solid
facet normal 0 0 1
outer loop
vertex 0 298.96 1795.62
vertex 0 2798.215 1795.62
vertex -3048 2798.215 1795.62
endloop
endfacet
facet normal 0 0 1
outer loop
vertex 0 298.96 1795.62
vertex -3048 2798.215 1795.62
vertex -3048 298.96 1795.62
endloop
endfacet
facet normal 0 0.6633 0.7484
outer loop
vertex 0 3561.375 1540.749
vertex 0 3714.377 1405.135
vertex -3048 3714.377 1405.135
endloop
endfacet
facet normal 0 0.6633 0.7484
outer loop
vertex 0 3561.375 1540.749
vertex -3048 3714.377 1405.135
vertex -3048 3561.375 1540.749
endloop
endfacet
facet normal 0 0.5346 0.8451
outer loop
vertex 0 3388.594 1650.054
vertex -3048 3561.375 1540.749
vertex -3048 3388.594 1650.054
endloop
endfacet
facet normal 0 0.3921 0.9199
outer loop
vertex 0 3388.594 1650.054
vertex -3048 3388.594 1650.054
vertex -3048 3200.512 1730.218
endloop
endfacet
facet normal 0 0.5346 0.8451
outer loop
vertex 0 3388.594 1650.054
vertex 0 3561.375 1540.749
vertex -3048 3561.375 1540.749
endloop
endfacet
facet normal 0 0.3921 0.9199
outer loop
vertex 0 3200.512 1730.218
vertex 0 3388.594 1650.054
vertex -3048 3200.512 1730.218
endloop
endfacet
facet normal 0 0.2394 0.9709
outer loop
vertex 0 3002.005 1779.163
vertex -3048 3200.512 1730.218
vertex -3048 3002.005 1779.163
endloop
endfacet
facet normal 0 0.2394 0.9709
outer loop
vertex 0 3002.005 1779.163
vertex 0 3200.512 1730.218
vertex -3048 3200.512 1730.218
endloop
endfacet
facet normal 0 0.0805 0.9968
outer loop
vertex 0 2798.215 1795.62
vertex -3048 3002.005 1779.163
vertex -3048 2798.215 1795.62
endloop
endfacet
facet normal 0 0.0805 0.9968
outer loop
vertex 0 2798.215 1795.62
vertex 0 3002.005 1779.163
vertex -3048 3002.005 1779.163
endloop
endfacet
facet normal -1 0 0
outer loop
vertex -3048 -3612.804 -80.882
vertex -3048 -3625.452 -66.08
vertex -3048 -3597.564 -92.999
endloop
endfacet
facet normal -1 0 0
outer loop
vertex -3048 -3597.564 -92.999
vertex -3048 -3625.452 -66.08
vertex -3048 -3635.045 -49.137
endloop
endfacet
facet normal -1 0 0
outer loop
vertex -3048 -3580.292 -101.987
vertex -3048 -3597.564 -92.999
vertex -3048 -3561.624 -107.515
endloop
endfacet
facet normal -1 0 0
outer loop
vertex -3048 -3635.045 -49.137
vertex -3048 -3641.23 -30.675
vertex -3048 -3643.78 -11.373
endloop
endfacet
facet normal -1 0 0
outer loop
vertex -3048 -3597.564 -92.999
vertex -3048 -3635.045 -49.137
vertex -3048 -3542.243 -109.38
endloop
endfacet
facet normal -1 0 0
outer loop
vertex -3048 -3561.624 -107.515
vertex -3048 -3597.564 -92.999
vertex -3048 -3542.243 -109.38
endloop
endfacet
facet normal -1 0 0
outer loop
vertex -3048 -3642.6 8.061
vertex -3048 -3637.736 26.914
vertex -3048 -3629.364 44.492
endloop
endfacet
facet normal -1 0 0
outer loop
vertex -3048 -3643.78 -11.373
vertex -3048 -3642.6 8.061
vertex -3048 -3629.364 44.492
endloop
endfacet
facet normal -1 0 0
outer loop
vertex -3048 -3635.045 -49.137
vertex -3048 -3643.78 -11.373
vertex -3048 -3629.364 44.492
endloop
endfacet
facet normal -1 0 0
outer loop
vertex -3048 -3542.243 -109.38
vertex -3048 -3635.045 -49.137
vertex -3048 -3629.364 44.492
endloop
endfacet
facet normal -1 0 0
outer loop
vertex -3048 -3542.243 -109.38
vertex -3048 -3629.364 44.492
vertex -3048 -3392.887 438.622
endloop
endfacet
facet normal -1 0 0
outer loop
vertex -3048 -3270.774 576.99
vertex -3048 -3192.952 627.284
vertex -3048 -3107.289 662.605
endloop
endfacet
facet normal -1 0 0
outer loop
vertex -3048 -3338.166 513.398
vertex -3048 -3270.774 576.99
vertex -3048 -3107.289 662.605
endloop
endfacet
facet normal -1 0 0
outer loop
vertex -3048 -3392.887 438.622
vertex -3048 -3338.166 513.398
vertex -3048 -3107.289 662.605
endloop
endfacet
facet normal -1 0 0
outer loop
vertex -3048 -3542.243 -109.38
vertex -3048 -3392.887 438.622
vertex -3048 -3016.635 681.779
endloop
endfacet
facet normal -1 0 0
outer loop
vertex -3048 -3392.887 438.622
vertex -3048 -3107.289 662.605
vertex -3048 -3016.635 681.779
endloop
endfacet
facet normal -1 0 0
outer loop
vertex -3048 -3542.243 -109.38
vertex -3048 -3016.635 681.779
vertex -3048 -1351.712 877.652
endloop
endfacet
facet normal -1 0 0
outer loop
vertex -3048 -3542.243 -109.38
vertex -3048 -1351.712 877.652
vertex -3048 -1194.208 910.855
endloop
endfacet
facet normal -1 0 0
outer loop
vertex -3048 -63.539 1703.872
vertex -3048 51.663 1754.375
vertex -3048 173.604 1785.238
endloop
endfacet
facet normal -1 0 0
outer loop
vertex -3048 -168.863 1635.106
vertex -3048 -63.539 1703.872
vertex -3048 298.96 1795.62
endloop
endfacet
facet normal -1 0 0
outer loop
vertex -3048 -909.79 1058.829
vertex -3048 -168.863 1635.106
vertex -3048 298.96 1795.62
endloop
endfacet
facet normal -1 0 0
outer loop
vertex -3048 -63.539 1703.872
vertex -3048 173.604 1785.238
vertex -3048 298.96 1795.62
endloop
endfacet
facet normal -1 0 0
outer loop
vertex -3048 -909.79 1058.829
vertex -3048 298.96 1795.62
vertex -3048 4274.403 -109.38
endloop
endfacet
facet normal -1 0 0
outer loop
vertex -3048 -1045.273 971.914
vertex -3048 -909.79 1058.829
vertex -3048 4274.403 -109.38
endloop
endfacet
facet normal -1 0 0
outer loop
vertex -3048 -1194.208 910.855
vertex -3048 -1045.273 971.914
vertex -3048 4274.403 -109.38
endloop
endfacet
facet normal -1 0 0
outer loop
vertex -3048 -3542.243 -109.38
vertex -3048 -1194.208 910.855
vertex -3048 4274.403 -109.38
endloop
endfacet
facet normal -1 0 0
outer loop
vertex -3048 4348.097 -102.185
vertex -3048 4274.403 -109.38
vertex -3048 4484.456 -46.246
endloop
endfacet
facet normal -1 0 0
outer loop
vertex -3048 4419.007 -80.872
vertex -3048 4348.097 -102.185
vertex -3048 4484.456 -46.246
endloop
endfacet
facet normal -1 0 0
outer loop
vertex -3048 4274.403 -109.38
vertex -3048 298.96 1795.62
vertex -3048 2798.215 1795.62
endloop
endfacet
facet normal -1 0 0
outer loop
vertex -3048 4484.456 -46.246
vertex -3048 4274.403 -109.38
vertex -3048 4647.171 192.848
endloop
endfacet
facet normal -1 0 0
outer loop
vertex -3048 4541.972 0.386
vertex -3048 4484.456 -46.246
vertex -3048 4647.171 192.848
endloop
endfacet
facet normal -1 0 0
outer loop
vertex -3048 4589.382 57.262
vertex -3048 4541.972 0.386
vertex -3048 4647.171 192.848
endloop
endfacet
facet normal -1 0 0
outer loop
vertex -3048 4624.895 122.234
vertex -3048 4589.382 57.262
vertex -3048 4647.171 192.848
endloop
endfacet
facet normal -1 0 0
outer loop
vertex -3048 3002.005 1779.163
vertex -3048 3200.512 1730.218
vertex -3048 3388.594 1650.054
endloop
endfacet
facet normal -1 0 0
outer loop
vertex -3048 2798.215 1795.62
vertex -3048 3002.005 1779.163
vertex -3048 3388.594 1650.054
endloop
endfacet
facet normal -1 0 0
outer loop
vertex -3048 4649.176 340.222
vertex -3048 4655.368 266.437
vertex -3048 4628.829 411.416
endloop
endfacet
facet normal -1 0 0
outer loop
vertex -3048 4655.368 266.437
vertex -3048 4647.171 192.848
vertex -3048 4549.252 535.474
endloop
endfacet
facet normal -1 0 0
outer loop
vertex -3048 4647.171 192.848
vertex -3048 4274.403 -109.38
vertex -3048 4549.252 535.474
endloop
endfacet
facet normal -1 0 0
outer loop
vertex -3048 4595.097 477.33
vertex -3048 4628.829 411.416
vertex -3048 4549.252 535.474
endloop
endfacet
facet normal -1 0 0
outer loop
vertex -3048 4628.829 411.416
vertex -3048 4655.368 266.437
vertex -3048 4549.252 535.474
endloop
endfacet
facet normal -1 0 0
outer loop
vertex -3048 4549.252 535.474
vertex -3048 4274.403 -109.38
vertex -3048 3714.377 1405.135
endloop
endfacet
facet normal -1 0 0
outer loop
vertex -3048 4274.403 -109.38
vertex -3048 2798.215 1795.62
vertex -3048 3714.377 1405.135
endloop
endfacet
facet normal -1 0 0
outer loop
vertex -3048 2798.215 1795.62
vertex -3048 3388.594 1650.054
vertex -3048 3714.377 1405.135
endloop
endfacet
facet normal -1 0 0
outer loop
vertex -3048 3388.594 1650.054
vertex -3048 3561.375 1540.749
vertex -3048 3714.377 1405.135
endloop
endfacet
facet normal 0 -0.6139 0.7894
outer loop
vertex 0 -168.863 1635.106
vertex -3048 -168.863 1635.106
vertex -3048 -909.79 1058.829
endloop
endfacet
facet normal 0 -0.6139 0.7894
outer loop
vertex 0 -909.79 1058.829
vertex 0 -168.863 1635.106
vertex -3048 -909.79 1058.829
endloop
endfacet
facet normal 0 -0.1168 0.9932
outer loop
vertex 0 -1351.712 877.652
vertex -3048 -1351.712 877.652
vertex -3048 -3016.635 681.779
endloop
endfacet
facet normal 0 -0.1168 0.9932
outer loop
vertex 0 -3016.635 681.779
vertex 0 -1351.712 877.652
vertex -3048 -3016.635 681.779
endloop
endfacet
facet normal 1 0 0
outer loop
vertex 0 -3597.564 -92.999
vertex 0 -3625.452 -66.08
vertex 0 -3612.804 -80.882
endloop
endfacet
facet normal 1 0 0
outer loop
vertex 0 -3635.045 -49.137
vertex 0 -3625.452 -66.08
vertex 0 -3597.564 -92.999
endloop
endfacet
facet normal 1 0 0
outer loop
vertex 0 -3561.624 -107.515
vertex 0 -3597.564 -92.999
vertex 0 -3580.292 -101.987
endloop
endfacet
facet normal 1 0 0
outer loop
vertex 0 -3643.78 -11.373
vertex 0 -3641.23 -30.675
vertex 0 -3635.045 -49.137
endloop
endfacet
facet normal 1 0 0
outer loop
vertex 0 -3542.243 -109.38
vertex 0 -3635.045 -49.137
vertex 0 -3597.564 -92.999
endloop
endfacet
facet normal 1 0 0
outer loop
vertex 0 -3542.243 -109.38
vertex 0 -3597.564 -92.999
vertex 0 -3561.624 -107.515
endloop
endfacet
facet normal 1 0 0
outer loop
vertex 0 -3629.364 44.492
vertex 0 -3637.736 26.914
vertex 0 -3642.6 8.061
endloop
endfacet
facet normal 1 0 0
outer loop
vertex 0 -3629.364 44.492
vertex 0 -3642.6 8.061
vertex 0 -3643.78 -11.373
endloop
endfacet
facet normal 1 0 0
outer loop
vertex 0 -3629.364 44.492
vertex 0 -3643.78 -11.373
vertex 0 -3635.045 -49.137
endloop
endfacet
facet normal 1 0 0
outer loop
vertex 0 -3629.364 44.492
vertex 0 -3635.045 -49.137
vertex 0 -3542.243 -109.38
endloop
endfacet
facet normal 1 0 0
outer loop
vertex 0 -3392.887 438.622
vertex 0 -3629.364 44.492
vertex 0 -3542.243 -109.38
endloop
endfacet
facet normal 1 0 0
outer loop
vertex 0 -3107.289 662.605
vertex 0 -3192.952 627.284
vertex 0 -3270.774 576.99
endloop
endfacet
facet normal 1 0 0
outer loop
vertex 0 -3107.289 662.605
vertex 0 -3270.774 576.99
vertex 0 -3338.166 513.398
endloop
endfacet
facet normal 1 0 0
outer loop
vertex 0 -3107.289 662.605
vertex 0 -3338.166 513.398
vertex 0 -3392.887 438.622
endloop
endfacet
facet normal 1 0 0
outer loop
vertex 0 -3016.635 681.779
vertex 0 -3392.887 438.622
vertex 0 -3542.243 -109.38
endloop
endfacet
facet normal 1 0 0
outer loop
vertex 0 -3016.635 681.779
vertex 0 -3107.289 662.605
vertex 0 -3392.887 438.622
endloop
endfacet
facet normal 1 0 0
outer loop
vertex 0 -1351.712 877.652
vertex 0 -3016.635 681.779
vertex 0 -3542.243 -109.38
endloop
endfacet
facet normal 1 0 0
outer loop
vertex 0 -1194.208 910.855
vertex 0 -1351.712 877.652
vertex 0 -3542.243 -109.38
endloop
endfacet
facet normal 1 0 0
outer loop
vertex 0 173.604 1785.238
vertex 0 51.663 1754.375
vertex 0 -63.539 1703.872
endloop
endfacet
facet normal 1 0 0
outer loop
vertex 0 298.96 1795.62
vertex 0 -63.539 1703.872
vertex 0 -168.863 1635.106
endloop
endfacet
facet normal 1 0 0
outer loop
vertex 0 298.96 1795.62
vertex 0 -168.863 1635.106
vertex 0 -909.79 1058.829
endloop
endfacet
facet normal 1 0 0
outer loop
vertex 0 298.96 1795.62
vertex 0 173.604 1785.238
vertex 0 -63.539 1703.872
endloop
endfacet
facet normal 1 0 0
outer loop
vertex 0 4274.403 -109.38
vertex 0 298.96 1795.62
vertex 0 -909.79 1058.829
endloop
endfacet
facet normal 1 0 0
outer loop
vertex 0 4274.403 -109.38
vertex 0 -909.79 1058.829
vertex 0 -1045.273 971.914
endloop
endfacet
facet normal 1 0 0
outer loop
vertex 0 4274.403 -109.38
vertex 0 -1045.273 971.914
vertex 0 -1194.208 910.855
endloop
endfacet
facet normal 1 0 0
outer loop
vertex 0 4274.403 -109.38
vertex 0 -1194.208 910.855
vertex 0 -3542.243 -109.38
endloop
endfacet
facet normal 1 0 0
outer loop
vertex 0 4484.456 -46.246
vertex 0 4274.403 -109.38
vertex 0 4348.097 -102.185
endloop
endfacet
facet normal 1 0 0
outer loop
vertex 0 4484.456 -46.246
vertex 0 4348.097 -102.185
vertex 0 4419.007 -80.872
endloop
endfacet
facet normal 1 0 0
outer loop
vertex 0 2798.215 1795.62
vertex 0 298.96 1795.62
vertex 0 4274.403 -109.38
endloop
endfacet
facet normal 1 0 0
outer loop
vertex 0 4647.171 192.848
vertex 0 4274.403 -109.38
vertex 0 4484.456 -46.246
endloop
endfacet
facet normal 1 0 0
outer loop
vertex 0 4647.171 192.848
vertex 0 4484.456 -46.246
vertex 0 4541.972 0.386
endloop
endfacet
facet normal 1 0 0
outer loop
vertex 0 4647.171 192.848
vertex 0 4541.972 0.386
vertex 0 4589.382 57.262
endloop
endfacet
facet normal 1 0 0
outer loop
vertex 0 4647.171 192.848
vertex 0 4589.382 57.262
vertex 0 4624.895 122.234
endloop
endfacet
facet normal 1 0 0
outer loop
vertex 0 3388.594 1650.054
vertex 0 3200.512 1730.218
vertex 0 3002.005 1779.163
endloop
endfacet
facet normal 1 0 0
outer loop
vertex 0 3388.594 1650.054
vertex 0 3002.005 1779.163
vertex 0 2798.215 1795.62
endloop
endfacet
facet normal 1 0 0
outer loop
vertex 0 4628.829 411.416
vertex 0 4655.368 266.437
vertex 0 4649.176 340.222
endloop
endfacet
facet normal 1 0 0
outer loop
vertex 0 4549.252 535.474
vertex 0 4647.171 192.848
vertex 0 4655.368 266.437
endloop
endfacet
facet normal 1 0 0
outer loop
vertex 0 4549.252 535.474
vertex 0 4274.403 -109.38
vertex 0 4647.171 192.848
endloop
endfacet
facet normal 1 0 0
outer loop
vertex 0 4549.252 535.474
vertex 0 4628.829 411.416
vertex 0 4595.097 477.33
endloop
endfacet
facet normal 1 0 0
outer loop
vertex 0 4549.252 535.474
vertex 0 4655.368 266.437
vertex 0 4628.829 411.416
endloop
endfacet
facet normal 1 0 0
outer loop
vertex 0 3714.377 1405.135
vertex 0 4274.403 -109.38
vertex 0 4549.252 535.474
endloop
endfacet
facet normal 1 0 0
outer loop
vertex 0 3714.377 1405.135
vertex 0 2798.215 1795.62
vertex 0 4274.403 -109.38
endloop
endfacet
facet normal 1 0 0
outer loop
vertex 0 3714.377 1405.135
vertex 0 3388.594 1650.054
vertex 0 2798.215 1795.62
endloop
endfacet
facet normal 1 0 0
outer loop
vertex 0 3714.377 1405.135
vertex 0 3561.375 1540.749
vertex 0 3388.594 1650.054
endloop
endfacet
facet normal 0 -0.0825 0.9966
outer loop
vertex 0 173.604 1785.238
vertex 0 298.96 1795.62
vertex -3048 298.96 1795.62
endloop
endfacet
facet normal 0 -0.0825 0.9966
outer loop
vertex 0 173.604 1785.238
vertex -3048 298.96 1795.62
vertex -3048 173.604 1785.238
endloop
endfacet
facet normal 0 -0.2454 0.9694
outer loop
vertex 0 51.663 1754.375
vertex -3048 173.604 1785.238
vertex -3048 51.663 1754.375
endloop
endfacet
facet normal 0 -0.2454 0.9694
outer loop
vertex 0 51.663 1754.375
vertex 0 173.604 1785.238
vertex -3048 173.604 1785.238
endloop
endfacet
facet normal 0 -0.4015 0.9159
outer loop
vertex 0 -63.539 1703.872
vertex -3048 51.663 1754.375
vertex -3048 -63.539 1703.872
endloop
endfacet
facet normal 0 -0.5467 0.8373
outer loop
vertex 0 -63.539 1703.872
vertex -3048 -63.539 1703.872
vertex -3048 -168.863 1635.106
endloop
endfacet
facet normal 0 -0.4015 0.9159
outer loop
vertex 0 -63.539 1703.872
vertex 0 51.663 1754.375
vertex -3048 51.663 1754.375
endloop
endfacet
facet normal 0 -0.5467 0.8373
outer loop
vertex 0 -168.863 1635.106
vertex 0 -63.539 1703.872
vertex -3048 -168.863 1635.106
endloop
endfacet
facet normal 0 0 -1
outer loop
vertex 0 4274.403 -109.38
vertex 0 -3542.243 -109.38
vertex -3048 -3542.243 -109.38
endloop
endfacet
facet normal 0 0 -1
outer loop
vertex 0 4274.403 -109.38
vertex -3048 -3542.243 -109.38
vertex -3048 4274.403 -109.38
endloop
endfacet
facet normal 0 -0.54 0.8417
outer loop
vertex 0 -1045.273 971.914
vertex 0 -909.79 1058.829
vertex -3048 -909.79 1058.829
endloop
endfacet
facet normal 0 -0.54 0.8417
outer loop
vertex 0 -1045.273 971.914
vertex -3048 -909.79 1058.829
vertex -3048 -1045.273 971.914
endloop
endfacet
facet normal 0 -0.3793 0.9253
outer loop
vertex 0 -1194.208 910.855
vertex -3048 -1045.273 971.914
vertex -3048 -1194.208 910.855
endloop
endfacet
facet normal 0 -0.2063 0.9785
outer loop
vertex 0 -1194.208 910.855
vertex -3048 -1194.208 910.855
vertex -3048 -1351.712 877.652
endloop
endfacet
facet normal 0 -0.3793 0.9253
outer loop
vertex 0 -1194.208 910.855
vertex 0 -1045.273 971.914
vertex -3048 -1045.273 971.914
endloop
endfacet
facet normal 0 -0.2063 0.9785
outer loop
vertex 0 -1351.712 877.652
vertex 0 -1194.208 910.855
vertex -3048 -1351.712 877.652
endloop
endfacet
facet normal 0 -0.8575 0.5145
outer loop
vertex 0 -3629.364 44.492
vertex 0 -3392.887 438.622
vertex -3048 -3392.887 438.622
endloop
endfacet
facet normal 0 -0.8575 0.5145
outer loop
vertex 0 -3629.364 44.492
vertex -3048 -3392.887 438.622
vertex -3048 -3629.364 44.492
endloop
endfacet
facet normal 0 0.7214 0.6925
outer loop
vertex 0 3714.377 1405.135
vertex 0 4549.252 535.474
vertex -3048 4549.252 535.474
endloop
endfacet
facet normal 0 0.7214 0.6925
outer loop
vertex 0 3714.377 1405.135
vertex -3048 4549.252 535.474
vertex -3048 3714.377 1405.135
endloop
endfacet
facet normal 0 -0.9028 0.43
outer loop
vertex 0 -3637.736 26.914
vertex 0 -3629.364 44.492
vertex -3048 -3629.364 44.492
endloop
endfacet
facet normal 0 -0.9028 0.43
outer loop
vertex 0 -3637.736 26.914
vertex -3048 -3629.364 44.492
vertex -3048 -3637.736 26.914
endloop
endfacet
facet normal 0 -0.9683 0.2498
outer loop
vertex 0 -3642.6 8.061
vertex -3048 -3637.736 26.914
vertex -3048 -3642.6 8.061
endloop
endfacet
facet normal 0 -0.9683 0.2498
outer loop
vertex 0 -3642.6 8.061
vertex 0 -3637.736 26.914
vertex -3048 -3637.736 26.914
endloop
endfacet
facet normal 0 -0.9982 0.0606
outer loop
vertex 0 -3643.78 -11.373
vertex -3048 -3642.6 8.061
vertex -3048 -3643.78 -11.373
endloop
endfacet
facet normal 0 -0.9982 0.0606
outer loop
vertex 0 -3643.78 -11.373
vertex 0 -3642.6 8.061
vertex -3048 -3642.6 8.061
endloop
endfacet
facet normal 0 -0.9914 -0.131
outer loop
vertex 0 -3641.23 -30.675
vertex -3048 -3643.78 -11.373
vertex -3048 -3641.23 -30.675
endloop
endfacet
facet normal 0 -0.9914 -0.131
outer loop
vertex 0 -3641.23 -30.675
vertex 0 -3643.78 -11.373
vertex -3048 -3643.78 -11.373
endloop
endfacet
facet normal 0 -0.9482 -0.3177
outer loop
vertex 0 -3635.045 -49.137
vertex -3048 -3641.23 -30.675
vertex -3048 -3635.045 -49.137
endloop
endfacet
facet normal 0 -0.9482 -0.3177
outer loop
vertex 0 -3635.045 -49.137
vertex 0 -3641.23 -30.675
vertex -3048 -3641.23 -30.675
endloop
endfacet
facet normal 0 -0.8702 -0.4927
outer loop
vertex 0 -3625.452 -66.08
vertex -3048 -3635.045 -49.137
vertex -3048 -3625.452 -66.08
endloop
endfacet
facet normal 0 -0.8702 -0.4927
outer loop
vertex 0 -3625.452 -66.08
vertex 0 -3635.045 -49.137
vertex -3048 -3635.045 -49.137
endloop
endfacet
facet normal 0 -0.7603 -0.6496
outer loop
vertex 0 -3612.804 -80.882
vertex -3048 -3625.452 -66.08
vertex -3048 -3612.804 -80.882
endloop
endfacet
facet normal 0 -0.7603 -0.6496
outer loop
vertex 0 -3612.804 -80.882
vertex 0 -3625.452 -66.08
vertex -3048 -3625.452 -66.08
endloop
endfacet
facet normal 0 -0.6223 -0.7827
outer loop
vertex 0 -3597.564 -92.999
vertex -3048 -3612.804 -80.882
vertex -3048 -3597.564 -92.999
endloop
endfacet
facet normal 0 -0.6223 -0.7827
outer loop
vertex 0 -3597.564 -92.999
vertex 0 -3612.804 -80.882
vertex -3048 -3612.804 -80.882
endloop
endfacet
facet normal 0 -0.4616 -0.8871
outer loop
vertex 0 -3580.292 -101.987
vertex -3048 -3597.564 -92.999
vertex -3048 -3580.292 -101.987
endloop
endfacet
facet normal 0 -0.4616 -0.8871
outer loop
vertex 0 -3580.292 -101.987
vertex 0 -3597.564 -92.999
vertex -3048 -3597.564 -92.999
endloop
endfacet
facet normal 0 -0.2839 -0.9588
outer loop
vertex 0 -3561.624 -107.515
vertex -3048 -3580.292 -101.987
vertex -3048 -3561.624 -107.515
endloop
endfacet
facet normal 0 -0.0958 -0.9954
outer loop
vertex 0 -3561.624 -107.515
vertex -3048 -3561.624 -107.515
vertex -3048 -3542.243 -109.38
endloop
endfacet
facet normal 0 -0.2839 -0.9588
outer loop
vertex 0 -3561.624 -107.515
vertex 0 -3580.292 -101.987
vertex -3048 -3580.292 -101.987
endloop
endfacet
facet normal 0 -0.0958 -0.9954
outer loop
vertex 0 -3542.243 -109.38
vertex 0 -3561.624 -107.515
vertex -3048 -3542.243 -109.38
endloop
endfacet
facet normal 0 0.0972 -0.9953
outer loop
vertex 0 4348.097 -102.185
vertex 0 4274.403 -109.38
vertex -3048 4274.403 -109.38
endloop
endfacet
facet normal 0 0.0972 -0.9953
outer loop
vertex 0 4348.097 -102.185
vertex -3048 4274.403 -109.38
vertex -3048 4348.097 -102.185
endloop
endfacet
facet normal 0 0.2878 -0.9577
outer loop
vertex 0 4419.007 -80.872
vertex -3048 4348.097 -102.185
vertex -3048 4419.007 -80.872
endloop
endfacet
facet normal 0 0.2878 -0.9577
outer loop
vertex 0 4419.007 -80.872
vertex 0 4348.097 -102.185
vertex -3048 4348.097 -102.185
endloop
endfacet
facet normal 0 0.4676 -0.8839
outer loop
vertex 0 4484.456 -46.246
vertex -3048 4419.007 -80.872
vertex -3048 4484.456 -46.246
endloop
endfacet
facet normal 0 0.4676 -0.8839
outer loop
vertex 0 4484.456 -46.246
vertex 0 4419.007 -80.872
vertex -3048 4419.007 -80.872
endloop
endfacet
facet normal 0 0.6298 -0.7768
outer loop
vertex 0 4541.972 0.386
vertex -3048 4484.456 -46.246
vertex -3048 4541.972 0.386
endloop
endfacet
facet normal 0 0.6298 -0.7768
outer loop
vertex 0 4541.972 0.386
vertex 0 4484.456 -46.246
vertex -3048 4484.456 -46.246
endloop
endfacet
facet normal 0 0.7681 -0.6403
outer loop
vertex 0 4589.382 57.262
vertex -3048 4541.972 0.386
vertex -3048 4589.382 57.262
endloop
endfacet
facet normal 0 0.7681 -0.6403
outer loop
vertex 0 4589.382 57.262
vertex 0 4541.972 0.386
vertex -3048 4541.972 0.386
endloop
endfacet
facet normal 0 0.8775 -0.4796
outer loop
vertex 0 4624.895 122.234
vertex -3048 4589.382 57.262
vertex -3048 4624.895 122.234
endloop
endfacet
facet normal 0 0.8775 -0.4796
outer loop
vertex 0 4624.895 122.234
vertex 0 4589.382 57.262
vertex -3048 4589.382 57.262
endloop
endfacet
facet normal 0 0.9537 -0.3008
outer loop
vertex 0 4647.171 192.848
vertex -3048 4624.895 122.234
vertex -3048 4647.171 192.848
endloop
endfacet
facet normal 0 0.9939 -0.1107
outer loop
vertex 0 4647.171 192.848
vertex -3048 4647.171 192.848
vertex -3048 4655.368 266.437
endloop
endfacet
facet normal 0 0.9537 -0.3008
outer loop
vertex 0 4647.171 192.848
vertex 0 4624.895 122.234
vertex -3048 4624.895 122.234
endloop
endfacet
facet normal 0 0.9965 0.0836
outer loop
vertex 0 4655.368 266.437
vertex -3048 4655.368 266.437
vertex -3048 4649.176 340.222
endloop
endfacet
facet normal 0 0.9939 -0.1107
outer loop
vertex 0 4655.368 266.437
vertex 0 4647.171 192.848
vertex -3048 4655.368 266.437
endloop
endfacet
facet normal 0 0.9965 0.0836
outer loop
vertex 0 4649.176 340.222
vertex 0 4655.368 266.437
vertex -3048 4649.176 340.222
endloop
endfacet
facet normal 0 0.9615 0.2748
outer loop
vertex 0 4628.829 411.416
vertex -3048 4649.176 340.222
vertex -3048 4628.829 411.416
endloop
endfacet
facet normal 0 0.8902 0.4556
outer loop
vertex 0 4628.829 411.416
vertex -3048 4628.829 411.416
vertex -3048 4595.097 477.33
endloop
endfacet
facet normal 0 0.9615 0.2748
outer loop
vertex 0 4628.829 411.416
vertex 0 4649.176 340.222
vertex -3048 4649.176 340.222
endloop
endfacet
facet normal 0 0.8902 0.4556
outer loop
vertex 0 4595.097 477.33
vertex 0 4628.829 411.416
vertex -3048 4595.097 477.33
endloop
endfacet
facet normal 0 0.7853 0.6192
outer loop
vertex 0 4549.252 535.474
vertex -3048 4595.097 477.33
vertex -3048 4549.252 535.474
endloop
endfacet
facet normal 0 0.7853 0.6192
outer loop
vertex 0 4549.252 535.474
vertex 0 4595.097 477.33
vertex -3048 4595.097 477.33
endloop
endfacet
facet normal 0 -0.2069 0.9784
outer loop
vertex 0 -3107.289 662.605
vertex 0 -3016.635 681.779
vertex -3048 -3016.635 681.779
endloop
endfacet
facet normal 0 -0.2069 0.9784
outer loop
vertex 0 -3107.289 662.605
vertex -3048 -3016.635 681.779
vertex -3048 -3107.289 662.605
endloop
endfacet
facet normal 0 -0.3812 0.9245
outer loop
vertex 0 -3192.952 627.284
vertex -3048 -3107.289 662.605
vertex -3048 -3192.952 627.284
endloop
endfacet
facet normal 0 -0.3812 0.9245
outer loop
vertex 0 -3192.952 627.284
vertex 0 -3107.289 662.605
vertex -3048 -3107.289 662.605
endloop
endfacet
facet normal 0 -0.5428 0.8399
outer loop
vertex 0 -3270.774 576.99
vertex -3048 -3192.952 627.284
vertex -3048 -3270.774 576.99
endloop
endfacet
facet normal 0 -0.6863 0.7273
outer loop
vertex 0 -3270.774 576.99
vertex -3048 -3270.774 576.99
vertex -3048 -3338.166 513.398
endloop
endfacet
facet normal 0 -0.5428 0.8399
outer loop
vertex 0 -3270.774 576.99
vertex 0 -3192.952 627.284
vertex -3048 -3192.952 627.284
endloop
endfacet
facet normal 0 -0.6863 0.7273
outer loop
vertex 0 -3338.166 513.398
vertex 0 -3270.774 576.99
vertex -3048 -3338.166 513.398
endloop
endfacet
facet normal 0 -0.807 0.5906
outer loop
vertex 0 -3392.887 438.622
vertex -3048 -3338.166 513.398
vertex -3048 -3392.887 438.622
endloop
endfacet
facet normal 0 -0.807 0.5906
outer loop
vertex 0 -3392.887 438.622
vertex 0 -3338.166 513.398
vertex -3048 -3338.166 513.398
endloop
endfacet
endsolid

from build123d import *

# Parameters (mm, degrees)
F1_DEPTH = 3048


with BuildPart() as f1:
    # F0 (on Right) → F1 (new body)
    with BuildSketch(Plane.YZ):
        with BuildLine():
            ThreePointArc((-3629.364354, 44.492335), (-3630.655384, -57.838634), (-3542.243073, -109.380434))
            Line((-3542.243073, -109.380434), (4274.402974, -109.380434))
            ThreePointArc((4274.402974, -109.380434), (4624.895208, 122.23351), (4549.251543, 535.474192))
            Line((4549.251543, 535.474192), (3714.377179, 1405.134988))
            ThreePointArc((3714.377179, 1405.134988), (3296.168801, 1693.927014), (2798.215282, 1795.619566))
            Line((2798.215282, 1795.619566), (298.96009, 1795.619566))
            ThreePointArc((298.96009, 1795.619566), (51.663334, 1754.374944), (-168.862657, 1635.105955))
            Line((-168.862657, 1635.105955), (-909.790381, 1058.828838))
            ThreePointArc((-909.790381, 1058.828838), (-1118.356018, 938.006841), (-1351.711717, 877.652072))
            Line((-1351.711717, 877.652072), (-3016.635489, 681.778687))
            ThreePointArc((-3016.635489, 681.778687), (-3233.012028, 603.914861), (-3392.886541, 438.622023))
            Line((-3392.886541, 438.622023), (-3629.364354, 44.492335))
        make_face()
    extrude(amount=-F1_DEPTH)


solid = f1.part
